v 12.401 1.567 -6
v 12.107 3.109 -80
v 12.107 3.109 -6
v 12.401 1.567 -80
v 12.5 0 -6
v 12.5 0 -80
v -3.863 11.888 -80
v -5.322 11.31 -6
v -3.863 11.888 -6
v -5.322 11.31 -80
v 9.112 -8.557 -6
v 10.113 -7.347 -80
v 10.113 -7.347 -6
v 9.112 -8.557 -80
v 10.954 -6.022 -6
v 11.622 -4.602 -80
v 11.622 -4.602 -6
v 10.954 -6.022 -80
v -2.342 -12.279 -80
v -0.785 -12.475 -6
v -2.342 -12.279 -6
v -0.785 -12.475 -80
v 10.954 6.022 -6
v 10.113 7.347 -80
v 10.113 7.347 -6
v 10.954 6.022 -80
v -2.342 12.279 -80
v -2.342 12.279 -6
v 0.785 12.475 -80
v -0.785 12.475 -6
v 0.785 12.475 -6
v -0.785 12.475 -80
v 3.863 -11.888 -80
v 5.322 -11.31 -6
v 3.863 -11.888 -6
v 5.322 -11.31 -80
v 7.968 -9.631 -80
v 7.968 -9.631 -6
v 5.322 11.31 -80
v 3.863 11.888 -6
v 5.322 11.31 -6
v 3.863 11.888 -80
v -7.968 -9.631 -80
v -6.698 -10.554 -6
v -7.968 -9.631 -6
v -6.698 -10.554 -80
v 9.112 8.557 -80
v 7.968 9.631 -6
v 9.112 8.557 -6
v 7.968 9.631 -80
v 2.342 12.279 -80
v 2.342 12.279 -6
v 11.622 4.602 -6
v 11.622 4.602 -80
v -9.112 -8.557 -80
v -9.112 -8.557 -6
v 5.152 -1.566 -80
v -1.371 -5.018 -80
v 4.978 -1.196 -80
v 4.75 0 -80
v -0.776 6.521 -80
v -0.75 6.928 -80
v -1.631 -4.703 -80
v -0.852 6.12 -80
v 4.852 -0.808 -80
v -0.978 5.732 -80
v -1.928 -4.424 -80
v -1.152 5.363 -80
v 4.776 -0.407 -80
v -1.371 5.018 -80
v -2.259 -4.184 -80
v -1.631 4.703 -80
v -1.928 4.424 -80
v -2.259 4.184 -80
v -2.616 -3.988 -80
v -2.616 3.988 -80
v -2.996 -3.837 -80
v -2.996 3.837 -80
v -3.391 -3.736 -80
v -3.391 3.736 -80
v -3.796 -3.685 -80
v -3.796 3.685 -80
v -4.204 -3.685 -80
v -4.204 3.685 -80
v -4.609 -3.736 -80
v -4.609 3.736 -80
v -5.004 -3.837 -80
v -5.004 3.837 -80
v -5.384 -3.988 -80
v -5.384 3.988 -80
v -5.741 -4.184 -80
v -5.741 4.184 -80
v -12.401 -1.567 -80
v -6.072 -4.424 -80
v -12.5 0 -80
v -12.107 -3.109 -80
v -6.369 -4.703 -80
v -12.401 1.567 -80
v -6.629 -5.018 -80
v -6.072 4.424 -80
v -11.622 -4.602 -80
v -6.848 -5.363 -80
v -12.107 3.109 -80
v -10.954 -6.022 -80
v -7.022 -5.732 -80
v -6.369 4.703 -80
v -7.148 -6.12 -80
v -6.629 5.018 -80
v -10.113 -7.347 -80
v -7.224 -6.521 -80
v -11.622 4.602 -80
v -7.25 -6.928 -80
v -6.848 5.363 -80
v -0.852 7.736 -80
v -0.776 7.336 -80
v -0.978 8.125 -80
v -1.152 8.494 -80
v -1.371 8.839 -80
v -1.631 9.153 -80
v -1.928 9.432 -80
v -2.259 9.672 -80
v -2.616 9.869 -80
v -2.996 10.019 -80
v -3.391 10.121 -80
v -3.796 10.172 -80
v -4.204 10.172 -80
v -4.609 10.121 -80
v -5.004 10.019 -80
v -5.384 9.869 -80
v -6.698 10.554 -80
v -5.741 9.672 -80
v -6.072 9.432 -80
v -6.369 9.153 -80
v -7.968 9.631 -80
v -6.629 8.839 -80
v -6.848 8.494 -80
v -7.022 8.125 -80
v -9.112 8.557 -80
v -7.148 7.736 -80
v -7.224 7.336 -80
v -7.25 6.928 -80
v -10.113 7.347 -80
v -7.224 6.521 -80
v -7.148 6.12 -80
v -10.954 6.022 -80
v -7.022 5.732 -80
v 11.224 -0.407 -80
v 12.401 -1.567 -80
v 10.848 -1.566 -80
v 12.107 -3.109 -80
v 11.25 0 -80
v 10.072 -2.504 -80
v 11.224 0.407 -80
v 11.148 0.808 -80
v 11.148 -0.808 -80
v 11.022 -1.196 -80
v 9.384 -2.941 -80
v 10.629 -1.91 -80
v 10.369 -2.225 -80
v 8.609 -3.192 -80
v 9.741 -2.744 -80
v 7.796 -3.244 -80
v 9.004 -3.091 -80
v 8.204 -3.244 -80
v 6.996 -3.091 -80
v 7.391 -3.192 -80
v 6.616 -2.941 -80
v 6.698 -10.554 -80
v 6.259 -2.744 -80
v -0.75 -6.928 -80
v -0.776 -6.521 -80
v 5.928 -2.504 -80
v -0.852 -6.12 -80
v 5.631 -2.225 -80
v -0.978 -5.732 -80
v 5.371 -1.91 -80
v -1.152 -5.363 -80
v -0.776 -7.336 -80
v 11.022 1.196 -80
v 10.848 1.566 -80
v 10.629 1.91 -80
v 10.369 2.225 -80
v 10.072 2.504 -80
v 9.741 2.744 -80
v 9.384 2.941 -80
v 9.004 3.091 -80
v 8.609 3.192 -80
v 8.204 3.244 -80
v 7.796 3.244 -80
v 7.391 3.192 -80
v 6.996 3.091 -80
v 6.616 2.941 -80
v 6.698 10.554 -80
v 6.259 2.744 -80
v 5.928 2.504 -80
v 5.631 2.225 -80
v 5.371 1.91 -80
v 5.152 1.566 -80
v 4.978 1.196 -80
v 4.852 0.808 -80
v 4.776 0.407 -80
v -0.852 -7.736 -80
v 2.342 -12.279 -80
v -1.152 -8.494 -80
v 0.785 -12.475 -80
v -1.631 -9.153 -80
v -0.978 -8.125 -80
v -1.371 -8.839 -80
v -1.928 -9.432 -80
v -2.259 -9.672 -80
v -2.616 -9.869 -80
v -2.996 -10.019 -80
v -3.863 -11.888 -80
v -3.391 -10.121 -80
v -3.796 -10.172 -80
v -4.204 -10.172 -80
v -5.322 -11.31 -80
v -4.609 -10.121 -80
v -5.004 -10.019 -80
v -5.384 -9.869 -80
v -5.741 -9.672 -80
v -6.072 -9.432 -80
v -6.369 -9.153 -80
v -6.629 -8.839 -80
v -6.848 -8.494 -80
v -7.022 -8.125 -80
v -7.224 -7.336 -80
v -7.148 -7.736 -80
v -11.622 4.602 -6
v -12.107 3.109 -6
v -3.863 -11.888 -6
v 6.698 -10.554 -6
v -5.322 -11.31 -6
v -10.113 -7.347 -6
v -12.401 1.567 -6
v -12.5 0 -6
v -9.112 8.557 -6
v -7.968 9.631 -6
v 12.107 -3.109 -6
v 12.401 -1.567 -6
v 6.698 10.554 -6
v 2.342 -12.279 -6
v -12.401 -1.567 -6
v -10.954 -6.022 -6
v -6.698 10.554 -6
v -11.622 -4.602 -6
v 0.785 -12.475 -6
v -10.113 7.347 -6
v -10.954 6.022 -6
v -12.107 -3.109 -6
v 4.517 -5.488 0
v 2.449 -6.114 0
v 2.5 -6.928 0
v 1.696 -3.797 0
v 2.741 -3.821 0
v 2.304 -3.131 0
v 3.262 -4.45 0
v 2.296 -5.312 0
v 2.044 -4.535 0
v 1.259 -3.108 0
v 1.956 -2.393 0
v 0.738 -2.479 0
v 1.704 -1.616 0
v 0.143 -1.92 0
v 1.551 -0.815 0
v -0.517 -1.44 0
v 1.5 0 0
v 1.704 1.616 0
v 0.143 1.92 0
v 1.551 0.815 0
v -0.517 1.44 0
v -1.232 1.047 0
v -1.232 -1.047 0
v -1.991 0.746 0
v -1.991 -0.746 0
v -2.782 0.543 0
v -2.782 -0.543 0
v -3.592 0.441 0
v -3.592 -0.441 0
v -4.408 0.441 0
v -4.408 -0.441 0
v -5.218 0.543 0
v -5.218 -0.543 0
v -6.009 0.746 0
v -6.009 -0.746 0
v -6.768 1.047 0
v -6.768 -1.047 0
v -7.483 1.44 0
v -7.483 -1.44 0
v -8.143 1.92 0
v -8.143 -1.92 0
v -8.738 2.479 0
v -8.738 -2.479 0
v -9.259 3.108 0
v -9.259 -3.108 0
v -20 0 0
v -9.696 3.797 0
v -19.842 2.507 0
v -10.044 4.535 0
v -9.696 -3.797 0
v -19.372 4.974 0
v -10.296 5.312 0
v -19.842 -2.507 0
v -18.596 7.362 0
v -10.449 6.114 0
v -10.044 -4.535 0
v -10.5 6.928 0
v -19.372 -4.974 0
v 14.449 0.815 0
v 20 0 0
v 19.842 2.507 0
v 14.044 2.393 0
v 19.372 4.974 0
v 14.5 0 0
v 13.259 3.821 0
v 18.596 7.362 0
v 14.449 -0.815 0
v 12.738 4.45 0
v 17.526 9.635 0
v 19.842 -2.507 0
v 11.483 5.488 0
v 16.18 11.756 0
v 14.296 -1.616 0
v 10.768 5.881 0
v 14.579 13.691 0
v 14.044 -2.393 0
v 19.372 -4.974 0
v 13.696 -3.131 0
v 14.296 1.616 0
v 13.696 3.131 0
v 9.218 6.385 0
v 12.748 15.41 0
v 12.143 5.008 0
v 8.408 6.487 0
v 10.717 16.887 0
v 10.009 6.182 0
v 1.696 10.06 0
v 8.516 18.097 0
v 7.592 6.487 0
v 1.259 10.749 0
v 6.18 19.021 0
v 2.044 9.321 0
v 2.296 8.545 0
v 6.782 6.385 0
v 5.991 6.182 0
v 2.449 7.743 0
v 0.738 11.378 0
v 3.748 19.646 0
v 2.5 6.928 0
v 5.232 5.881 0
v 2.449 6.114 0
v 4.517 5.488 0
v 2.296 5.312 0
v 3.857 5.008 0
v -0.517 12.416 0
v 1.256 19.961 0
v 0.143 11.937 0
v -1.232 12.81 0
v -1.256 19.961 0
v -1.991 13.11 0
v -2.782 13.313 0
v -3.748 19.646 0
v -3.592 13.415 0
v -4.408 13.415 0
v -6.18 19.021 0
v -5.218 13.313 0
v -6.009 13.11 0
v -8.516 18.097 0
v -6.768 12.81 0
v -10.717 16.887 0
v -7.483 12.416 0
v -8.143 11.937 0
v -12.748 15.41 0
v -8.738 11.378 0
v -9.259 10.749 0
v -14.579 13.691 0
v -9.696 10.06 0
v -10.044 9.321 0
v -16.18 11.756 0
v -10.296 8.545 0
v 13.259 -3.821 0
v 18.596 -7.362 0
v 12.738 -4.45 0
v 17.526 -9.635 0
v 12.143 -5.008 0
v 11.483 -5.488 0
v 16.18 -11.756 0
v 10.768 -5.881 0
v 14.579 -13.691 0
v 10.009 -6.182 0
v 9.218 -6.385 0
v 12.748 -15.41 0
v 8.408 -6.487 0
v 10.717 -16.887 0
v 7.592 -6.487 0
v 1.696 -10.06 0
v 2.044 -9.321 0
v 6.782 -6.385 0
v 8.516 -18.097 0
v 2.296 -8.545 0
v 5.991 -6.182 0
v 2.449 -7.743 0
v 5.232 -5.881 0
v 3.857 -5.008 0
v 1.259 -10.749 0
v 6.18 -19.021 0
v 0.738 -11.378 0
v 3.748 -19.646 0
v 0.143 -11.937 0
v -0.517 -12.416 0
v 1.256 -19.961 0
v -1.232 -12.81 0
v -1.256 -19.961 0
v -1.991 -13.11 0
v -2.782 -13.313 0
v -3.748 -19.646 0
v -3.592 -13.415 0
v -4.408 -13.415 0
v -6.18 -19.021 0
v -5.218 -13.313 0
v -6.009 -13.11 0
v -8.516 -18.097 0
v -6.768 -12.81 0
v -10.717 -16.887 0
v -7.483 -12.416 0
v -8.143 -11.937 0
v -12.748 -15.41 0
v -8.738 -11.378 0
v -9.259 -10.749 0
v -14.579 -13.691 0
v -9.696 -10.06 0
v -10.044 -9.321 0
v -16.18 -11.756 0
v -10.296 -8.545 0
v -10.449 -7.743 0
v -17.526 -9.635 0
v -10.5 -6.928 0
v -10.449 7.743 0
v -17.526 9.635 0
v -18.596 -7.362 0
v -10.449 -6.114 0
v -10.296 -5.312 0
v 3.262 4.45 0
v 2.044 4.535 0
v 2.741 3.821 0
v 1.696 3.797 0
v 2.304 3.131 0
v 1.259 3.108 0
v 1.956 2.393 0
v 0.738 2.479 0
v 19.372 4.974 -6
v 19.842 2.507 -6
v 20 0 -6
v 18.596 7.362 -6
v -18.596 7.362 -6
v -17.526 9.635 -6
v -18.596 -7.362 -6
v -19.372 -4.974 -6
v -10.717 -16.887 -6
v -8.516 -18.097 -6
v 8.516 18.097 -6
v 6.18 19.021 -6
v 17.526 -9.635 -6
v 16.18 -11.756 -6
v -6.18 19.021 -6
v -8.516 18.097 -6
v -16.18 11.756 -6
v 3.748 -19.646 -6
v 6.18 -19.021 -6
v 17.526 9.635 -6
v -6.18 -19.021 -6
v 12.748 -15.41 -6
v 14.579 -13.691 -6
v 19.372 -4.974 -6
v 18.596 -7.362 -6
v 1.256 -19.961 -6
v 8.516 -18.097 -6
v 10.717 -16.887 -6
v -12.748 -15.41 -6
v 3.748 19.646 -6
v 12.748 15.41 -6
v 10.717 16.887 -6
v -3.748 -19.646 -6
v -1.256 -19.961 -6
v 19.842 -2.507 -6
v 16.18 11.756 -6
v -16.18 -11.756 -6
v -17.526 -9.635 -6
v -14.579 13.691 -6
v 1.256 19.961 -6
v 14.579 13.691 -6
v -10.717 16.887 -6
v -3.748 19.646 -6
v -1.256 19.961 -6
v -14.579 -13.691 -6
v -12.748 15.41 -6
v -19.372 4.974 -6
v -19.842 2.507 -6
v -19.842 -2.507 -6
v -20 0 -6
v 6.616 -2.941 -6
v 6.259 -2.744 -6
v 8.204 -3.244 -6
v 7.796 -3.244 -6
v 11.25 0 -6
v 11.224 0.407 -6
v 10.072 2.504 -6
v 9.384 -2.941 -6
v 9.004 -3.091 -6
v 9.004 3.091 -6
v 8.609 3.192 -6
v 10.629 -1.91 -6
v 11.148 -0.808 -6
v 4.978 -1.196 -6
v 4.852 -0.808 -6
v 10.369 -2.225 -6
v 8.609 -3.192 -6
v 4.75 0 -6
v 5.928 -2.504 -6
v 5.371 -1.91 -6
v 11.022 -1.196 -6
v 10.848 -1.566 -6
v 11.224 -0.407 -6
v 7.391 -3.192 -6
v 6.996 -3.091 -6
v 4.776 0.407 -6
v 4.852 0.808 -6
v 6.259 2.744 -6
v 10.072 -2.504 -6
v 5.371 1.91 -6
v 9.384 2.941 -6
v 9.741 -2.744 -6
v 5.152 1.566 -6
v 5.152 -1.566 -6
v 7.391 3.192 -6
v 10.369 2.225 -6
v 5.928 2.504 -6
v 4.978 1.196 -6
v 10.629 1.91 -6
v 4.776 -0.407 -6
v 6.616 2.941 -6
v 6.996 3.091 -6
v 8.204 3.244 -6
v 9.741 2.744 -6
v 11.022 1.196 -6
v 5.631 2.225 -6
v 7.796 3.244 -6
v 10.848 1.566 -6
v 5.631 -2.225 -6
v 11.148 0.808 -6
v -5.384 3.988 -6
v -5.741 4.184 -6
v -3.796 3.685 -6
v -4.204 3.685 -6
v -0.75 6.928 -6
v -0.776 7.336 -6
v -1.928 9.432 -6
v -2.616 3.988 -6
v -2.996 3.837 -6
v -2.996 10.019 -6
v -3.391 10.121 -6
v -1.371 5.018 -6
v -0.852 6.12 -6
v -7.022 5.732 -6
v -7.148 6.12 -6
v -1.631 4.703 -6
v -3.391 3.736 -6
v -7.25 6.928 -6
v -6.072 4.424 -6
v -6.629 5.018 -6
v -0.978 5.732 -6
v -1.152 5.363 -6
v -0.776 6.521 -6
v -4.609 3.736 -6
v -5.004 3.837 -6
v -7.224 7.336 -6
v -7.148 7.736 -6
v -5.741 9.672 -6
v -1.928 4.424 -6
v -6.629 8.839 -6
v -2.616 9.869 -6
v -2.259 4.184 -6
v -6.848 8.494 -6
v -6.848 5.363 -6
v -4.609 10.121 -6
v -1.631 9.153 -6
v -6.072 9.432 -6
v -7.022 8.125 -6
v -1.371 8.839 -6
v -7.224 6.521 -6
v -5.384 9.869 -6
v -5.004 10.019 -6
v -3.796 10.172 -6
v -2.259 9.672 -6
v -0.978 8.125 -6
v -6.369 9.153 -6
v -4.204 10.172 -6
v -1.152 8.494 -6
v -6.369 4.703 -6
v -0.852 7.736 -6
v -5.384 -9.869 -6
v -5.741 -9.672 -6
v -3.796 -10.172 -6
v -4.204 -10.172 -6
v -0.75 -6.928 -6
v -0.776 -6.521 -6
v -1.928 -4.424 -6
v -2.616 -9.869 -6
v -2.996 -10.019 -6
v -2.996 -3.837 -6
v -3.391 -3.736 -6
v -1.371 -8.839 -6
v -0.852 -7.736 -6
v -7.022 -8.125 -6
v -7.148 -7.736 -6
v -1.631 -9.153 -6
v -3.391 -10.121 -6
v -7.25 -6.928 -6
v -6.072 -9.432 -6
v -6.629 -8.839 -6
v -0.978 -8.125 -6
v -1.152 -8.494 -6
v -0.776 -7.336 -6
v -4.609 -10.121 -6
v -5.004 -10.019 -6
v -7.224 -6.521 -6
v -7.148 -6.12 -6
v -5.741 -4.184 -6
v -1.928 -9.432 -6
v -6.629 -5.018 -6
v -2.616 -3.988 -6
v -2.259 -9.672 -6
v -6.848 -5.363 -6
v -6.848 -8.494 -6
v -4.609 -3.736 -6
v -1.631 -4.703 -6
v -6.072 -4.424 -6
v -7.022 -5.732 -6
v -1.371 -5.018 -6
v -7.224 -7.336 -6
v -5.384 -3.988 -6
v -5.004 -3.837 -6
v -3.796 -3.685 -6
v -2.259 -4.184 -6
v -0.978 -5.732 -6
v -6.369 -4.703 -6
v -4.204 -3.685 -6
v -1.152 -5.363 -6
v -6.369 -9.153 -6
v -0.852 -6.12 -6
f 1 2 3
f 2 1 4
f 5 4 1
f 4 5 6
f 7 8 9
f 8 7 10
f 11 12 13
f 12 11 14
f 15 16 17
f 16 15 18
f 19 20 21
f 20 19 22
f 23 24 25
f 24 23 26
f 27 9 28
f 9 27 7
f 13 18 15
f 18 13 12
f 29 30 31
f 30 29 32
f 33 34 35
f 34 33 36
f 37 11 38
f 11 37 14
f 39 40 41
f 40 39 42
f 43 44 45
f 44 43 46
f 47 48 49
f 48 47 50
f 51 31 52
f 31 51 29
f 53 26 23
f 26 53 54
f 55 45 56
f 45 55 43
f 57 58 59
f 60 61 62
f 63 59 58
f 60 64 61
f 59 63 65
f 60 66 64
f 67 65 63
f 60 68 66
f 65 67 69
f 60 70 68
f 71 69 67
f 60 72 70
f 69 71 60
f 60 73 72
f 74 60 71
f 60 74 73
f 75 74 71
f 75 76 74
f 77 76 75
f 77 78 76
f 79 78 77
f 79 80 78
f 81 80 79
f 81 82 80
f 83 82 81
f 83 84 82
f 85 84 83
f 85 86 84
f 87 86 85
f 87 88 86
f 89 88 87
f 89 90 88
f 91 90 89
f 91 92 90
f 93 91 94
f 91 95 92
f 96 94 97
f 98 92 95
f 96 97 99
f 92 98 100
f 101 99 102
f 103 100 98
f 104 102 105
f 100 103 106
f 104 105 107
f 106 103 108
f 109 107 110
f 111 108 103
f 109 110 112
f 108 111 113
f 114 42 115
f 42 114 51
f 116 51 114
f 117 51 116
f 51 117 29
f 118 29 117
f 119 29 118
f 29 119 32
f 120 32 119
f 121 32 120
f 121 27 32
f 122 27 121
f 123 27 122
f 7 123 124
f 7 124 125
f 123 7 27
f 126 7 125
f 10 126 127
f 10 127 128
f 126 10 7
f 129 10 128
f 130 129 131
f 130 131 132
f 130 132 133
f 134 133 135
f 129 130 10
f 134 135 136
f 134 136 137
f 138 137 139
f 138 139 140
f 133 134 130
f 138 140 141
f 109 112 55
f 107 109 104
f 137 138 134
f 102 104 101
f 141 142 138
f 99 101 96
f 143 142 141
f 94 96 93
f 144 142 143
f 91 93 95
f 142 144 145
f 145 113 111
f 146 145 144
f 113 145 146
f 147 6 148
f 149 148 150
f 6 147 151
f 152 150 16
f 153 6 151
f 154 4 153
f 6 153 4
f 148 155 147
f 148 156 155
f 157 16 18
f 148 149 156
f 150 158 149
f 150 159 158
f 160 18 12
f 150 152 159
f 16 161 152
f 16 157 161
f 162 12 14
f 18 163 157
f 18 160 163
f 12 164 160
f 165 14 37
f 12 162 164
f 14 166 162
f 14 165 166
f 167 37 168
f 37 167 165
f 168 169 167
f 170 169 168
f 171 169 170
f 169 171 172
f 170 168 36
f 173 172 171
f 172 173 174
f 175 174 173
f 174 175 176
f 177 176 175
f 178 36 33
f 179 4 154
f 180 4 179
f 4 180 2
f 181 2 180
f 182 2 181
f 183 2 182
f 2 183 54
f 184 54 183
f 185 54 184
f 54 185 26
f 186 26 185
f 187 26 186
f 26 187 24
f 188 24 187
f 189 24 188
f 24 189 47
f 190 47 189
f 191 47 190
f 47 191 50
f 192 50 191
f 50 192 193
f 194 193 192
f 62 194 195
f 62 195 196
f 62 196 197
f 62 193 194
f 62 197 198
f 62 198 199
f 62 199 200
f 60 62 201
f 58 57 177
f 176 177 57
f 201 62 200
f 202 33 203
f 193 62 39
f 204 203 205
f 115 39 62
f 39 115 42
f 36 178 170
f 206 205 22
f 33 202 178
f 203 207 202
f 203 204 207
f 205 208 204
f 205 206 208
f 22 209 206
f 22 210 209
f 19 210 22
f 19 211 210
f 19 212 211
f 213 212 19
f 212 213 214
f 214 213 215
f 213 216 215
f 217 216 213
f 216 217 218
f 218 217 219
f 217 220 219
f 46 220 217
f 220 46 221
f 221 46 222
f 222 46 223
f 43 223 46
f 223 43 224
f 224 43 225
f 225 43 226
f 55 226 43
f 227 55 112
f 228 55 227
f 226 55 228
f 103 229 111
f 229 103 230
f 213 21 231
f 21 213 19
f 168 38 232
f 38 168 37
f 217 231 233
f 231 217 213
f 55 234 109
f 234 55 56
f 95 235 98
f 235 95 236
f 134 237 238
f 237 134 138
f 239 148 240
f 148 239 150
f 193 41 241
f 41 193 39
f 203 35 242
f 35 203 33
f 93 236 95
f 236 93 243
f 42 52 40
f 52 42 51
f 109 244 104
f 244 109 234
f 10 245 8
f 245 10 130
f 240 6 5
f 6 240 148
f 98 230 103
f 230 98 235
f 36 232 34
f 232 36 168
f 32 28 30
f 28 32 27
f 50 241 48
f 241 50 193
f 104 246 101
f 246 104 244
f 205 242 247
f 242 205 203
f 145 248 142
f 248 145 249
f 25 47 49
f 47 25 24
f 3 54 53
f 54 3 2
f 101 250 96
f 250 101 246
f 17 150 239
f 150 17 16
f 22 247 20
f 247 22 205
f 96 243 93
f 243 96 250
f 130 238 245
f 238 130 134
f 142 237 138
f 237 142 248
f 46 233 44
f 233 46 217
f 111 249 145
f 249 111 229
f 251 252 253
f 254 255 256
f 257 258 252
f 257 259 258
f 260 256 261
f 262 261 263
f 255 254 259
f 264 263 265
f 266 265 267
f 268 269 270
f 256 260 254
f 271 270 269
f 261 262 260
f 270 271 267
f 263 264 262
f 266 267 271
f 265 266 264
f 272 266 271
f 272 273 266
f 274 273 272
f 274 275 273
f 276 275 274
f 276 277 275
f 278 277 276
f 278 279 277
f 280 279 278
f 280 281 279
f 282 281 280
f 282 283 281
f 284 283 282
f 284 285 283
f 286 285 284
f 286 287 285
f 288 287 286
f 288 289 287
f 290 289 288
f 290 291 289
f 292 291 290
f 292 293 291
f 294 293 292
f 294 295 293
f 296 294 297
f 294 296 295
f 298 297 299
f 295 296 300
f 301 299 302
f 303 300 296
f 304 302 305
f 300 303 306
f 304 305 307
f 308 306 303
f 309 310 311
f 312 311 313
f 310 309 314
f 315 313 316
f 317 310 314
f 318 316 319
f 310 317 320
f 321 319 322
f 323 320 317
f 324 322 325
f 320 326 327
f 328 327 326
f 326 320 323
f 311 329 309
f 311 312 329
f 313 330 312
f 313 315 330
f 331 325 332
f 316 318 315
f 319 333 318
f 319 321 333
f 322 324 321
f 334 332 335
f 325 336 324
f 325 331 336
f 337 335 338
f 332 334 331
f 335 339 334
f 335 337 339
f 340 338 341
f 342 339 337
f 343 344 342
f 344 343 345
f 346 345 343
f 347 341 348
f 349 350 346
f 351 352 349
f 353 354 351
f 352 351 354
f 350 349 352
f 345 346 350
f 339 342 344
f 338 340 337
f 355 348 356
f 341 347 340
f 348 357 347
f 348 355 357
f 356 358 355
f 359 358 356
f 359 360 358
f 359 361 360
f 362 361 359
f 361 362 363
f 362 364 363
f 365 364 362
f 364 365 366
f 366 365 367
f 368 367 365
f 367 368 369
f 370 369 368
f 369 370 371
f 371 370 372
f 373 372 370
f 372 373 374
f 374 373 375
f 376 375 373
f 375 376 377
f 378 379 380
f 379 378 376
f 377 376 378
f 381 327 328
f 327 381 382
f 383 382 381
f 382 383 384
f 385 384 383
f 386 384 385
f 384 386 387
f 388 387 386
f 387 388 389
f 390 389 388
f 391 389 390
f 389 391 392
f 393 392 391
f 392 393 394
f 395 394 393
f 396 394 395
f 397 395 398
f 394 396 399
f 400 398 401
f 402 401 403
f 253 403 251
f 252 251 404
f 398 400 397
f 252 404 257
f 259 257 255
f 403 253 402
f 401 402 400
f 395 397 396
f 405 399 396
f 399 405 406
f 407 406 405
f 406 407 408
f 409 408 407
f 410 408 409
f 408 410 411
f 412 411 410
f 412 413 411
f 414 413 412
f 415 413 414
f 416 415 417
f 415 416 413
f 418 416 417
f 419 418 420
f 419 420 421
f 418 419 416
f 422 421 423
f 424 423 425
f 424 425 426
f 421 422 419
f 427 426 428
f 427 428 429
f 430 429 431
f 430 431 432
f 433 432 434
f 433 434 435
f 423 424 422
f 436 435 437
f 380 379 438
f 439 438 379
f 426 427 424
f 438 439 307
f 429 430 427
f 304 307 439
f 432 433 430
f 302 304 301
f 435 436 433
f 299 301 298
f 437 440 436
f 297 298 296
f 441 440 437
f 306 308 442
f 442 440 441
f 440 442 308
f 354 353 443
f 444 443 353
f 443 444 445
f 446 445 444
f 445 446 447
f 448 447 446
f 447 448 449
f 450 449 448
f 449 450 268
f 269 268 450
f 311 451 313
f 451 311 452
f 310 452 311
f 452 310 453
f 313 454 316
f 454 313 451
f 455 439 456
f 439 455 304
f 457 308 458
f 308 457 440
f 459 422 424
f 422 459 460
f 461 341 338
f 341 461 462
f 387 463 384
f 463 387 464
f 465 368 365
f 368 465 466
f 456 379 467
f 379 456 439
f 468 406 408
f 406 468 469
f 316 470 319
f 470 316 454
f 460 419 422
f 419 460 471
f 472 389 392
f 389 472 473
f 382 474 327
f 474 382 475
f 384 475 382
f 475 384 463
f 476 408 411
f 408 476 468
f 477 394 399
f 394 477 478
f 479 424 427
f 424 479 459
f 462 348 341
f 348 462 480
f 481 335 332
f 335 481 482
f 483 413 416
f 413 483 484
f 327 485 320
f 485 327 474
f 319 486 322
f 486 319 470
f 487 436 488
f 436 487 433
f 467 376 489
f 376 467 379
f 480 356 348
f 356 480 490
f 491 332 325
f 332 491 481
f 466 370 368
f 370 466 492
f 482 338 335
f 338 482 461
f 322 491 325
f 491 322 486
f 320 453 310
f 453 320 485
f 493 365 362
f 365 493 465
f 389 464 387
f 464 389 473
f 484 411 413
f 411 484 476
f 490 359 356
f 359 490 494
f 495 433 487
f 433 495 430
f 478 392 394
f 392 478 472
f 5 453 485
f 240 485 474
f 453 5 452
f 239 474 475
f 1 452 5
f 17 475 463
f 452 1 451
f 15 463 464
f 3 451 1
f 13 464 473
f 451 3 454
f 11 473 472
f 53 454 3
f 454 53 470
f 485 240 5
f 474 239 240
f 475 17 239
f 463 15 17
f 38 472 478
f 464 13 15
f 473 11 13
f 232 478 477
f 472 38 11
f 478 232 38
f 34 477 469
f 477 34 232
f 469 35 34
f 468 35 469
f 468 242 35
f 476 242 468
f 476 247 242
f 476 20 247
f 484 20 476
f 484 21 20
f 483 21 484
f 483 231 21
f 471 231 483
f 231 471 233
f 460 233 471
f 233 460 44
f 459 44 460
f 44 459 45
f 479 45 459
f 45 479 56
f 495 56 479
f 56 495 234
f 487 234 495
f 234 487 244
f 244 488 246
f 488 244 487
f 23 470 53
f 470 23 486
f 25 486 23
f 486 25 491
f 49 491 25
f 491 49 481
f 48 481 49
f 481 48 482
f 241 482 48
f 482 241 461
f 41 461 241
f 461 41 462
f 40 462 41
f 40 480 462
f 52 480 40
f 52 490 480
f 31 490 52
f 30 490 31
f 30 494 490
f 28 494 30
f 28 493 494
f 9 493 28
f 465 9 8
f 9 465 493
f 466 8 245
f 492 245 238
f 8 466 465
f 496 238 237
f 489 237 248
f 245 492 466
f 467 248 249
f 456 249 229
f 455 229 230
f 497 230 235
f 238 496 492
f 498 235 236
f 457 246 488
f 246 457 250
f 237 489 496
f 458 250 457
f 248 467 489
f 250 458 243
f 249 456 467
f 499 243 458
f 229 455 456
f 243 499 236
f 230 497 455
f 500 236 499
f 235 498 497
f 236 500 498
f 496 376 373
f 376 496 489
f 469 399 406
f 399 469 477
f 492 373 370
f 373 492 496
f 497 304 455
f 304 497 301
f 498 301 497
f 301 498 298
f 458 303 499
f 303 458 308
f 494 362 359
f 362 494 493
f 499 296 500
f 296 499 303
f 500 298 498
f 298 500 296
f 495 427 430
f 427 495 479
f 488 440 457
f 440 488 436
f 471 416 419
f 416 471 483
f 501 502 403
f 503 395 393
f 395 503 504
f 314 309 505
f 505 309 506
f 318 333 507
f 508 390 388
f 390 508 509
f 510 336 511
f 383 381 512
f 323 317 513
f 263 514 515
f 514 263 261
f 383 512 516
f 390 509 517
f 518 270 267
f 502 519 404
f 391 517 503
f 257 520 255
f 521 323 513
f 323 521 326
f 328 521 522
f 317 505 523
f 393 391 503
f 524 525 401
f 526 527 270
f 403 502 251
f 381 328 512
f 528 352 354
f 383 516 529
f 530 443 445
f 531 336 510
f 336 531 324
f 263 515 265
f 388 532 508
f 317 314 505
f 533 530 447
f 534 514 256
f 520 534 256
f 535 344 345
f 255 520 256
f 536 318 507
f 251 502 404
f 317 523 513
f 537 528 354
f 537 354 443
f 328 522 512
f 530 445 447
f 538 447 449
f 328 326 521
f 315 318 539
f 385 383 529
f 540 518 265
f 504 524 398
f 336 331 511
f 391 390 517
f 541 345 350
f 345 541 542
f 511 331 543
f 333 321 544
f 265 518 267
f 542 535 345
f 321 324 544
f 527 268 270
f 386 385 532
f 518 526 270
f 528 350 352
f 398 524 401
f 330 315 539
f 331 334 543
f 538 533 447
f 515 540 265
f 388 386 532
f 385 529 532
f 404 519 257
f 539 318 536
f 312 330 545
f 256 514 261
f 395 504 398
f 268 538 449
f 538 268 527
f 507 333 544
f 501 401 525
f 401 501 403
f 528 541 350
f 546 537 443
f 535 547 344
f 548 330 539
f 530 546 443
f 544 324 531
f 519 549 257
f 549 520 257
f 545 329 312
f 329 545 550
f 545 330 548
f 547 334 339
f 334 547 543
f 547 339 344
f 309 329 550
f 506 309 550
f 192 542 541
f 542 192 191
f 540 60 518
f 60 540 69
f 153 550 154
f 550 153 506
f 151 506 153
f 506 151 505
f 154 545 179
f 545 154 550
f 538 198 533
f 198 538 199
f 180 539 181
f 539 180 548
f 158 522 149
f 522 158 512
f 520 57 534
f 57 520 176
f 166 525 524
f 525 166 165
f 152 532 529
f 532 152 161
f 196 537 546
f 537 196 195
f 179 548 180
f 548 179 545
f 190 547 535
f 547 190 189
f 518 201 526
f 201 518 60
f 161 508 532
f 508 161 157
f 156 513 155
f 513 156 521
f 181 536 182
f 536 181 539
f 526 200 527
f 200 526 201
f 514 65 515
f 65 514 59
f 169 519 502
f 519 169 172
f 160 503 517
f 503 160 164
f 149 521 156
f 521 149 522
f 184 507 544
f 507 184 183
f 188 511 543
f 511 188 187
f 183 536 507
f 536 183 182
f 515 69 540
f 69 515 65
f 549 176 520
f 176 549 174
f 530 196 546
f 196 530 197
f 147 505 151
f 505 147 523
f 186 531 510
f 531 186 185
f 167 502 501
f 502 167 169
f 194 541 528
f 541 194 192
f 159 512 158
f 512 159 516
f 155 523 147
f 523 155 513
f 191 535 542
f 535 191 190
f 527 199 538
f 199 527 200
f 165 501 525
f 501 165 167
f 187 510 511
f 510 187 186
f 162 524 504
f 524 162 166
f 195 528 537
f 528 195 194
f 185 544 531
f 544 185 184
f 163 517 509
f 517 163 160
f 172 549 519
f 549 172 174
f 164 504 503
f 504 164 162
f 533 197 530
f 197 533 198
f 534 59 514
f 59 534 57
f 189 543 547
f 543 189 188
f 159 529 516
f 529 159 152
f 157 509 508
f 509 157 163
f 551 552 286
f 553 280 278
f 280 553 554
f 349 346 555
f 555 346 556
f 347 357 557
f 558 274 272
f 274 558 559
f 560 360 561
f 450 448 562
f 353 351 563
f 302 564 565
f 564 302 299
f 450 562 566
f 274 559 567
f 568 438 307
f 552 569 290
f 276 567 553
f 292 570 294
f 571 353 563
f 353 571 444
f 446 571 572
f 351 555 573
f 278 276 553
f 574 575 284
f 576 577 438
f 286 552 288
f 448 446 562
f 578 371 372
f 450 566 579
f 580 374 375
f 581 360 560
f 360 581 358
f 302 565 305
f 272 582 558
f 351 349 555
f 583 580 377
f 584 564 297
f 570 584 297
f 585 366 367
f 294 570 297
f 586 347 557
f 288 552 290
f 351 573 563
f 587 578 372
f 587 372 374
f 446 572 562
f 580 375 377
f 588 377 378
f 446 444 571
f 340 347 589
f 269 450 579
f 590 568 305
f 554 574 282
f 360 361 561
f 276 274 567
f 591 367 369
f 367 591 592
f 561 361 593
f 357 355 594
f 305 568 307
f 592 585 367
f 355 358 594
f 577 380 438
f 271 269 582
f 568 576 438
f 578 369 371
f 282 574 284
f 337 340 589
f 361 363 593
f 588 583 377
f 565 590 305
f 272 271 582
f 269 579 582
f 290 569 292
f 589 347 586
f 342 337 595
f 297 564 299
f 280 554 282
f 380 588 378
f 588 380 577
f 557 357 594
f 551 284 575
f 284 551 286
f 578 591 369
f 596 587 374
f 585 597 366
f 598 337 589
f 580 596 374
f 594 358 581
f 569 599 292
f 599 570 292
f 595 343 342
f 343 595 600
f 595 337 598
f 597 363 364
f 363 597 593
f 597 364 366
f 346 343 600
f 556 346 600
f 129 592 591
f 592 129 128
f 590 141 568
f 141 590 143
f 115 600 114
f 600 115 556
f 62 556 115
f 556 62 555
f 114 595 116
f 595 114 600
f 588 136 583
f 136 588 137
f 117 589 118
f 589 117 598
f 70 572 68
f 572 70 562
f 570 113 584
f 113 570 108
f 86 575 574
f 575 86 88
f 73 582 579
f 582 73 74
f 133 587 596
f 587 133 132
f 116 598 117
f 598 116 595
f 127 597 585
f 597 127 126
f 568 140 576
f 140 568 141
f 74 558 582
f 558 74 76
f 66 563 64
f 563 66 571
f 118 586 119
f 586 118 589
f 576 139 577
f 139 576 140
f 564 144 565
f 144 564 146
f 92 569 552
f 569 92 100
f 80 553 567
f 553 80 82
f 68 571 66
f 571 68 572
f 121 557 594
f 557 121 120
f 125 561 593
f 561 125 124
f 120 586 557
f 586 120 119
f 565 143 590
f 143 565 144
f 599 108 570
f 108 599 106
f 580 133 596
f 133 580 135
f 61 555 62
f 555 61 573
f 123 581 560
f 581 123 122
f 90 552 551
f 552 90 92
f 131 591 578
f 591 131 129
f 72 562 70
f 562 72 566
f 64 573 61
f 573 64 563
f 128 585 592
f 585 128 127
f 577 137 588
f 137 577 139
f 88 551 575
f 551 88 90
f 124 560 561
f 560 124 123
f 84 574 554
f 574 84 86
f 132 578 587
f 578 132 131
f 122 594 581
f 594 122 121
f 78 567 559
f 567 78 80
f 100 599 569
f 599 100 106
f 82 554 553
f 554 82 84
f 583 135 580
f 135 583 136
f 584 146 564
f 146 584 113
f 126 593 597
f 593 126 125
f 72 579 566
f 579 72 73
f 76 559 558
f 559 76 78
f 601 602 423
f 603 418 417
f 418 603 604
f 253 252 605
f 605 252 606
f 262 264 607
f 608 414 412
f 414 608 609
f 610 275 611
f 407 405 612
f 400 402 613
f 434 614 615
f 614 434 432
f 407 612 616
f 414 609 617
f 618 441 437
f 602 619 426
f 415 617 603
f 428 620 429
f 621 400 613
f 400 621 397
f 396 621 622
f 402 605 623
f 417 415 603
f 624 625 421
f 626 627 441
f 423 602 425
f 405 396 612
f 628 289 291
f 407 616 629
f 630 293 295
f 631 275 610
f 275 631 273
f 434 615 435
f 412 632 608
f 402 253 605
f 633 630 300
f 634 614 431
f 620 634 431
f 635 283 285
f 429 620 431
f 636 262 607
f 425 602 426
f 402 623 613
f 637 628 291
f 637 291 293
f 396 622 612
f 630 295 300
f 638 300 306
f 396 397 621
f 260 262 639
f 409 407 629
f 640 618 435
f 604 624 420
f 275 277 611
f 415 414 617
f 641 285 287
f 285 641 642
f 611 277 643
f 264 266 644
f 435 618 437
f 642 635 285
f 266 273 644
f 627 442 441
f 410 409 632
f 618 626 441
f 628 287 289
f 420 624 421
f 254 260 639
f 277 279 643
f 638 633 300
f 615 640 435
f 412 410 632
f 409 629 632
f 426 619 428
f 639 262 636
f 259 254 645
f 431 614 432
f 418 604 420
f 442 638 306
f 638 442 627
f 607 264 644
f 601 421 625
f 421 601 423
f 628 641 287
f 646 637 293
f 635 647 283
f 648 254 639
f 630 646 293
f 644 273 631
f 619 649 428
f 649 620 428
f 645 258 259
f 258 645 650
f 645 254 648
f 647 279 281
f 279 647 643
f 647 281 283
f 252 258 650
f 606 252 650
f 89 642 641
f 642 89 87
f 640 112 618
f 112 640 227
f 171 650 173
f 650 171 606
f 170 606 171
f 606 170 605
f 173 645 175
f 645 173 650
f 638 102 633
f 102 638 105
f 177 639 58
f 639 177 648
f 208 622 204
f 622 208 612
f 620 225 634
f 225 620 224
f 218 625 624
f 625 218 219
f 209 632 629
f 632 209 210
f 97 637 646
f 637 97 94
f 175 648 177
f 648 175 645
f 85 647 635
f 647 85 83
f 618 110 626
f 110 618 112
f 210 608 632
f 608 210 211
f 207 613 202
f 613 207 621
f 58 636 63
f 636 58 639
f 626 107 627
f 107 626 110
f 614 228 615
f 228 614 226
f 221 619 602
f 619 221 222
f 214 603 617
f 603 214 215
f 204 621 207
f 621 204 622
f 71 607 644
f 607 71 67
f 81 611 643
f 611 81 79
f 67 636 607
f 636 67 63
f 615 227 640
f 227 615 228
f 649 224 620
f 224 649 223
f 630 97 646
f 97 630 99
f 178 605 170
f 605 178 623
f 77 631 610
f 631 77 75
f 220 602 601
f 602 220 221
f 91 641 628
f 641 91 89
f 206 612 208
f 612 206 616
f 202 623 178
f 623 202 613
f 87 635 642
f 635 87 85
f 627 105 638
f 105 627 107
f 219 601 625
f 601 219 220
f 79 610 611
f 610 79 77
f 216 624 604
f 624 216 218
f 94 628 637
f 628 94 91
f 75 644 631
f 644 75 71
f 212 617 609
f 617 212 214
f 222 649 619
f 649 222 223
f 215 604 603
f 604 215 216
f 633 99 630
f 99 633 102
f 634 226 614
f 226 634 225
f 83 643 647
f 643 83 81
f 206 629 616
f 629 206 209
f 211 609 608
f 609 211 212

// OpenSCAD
$fn = 50;


difference() {
	union() {
		translate(v = [0, 0, -80.0000000000]) {
			cylinder(h = 80, r = 12.5000000000);
		}
		translate(v = [0, 0, -6.0000000000]) {
			cylinder(h = 6, r = 20.0000000000);
		}
	}
	union() {
		translate(v = [8.0000000000, 0.0000000000, 0]) {
			rotate(a = [0, 0, 0]) {
				difference() {
					union() {
						#translate(v = [0, 0, -80.0000000000]) {
							cylinder(h = 80, r = 2.2500000000);
						}
						#translate(v = [0, 0, -6]) {
							cylinder(h = 6, r = 12.5000000000, r1 = 3.2500000000, r2 = 6.5000000000);
						}
						#translate(v = [0, 0, -80.0000000000]) {
							cylinder(h = 80, r = 3.2500000000);
						}
						#translate(v = [0, 0, -80.0000000000]) {
							cylinder(h = 80, r = 2.2500000000);
						}
					}
					union();
				}
			}
		}
		translate(v = [-4.0000000000, 6.9282032303, 0]) {
			rotate(a = [0, 0, 0]) {
				difference() {
					union() {
						#translate(v = [0, 0, -80.0000000000]) {
							cylinder(h = 80, r = 2.2500000000);
						}
						#translate(v = [0, 0, -6]) {
							cylinder(h = 6, r = 12.5000000000, r1 = 3.2500000000, r2 = 6.5000000000);
						}
						#translate(v = [0, 0, -80.0000000000]) {
							cylinder(h = 80, r = 3.2500000000);
						}
						#translate(v = [0, 0, -80.0000000000]) {
							cylinder(h = 80, r = 2.2500000000);
						}
					}
					union();
				}
			}
		}
		translate(v = [-4.0000000000, -6.9282032303, 0]) {
			rotate(a = [0, 0, 0]) {
				difference() {
					union() {
						#translate(v = [0, 0, -80.0000000000]) {
							cylinder(h = 80, r = 2.2500000000);
						}
						#translate(v = [0, 0, -6]) {
							cylinder(h = 6, r = 12.5000000000, r1 = 3.2500000000, r2 = 6.5000000000);
						}
						#translate(v = [0, 0, -80.0000000000]) {
							cylinder(h = 80, r = 3.2500000000);
						}
						#translate(v = [0, 0, -80.0000000000]) {
							cylinder(h = 80, r = 2.2500000000);
						}
					}
					union();
				}
			}
		}
	}
}
